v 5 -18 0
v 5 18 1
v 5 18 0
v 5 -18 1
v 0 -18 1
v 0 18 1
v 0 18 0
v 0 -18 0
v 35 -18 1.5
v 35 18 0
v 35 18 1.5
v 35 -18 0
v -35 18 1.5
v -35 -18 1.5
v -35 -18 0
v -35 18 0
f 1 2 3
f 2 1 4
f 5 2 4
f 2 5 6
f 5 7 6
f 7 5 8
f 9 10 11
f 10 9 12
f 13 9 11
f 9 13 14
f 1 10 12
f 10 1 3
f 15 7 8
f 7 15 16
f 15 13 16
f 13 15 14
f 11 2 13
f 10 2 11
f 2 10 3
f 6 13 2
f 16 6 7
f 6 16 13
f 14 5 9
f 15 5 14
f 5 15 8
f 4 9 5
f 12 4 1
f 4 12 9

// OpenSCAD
// Agarose gel comb - a flat plate with a back bar and a row of rectangular teeth, for casting
// horizontal gels. NOVEL general part.
//

cols   = 10;
teeth_d = 5.0;
teeth_l = 12;
pitch  = 1.5;
bar_w   = 12;
t       = 1.5;

$fn = 48;

p2 = teeth_d + pitch;                 // centre-to-centre pitch
Lx = 70;                              // spine length (X)
wy = bar_w + 2 * teeth_l;             // overall width (Y): spine + two tooth rows

difference() {
    translate([-Lx / 2, -wy / 2, 0]) cube([Lx, wy, t]);
    for (i = [-cols / 2 : 1 : cols / 2 - 1])
        translate([0, i * p2 + (cols % 2 == 1 ? pitch / 2 : 0), -(t + 1)])
            cube([teeth_d, teeth_l, t + 2]);   // dig out the teeth, open the top
}
